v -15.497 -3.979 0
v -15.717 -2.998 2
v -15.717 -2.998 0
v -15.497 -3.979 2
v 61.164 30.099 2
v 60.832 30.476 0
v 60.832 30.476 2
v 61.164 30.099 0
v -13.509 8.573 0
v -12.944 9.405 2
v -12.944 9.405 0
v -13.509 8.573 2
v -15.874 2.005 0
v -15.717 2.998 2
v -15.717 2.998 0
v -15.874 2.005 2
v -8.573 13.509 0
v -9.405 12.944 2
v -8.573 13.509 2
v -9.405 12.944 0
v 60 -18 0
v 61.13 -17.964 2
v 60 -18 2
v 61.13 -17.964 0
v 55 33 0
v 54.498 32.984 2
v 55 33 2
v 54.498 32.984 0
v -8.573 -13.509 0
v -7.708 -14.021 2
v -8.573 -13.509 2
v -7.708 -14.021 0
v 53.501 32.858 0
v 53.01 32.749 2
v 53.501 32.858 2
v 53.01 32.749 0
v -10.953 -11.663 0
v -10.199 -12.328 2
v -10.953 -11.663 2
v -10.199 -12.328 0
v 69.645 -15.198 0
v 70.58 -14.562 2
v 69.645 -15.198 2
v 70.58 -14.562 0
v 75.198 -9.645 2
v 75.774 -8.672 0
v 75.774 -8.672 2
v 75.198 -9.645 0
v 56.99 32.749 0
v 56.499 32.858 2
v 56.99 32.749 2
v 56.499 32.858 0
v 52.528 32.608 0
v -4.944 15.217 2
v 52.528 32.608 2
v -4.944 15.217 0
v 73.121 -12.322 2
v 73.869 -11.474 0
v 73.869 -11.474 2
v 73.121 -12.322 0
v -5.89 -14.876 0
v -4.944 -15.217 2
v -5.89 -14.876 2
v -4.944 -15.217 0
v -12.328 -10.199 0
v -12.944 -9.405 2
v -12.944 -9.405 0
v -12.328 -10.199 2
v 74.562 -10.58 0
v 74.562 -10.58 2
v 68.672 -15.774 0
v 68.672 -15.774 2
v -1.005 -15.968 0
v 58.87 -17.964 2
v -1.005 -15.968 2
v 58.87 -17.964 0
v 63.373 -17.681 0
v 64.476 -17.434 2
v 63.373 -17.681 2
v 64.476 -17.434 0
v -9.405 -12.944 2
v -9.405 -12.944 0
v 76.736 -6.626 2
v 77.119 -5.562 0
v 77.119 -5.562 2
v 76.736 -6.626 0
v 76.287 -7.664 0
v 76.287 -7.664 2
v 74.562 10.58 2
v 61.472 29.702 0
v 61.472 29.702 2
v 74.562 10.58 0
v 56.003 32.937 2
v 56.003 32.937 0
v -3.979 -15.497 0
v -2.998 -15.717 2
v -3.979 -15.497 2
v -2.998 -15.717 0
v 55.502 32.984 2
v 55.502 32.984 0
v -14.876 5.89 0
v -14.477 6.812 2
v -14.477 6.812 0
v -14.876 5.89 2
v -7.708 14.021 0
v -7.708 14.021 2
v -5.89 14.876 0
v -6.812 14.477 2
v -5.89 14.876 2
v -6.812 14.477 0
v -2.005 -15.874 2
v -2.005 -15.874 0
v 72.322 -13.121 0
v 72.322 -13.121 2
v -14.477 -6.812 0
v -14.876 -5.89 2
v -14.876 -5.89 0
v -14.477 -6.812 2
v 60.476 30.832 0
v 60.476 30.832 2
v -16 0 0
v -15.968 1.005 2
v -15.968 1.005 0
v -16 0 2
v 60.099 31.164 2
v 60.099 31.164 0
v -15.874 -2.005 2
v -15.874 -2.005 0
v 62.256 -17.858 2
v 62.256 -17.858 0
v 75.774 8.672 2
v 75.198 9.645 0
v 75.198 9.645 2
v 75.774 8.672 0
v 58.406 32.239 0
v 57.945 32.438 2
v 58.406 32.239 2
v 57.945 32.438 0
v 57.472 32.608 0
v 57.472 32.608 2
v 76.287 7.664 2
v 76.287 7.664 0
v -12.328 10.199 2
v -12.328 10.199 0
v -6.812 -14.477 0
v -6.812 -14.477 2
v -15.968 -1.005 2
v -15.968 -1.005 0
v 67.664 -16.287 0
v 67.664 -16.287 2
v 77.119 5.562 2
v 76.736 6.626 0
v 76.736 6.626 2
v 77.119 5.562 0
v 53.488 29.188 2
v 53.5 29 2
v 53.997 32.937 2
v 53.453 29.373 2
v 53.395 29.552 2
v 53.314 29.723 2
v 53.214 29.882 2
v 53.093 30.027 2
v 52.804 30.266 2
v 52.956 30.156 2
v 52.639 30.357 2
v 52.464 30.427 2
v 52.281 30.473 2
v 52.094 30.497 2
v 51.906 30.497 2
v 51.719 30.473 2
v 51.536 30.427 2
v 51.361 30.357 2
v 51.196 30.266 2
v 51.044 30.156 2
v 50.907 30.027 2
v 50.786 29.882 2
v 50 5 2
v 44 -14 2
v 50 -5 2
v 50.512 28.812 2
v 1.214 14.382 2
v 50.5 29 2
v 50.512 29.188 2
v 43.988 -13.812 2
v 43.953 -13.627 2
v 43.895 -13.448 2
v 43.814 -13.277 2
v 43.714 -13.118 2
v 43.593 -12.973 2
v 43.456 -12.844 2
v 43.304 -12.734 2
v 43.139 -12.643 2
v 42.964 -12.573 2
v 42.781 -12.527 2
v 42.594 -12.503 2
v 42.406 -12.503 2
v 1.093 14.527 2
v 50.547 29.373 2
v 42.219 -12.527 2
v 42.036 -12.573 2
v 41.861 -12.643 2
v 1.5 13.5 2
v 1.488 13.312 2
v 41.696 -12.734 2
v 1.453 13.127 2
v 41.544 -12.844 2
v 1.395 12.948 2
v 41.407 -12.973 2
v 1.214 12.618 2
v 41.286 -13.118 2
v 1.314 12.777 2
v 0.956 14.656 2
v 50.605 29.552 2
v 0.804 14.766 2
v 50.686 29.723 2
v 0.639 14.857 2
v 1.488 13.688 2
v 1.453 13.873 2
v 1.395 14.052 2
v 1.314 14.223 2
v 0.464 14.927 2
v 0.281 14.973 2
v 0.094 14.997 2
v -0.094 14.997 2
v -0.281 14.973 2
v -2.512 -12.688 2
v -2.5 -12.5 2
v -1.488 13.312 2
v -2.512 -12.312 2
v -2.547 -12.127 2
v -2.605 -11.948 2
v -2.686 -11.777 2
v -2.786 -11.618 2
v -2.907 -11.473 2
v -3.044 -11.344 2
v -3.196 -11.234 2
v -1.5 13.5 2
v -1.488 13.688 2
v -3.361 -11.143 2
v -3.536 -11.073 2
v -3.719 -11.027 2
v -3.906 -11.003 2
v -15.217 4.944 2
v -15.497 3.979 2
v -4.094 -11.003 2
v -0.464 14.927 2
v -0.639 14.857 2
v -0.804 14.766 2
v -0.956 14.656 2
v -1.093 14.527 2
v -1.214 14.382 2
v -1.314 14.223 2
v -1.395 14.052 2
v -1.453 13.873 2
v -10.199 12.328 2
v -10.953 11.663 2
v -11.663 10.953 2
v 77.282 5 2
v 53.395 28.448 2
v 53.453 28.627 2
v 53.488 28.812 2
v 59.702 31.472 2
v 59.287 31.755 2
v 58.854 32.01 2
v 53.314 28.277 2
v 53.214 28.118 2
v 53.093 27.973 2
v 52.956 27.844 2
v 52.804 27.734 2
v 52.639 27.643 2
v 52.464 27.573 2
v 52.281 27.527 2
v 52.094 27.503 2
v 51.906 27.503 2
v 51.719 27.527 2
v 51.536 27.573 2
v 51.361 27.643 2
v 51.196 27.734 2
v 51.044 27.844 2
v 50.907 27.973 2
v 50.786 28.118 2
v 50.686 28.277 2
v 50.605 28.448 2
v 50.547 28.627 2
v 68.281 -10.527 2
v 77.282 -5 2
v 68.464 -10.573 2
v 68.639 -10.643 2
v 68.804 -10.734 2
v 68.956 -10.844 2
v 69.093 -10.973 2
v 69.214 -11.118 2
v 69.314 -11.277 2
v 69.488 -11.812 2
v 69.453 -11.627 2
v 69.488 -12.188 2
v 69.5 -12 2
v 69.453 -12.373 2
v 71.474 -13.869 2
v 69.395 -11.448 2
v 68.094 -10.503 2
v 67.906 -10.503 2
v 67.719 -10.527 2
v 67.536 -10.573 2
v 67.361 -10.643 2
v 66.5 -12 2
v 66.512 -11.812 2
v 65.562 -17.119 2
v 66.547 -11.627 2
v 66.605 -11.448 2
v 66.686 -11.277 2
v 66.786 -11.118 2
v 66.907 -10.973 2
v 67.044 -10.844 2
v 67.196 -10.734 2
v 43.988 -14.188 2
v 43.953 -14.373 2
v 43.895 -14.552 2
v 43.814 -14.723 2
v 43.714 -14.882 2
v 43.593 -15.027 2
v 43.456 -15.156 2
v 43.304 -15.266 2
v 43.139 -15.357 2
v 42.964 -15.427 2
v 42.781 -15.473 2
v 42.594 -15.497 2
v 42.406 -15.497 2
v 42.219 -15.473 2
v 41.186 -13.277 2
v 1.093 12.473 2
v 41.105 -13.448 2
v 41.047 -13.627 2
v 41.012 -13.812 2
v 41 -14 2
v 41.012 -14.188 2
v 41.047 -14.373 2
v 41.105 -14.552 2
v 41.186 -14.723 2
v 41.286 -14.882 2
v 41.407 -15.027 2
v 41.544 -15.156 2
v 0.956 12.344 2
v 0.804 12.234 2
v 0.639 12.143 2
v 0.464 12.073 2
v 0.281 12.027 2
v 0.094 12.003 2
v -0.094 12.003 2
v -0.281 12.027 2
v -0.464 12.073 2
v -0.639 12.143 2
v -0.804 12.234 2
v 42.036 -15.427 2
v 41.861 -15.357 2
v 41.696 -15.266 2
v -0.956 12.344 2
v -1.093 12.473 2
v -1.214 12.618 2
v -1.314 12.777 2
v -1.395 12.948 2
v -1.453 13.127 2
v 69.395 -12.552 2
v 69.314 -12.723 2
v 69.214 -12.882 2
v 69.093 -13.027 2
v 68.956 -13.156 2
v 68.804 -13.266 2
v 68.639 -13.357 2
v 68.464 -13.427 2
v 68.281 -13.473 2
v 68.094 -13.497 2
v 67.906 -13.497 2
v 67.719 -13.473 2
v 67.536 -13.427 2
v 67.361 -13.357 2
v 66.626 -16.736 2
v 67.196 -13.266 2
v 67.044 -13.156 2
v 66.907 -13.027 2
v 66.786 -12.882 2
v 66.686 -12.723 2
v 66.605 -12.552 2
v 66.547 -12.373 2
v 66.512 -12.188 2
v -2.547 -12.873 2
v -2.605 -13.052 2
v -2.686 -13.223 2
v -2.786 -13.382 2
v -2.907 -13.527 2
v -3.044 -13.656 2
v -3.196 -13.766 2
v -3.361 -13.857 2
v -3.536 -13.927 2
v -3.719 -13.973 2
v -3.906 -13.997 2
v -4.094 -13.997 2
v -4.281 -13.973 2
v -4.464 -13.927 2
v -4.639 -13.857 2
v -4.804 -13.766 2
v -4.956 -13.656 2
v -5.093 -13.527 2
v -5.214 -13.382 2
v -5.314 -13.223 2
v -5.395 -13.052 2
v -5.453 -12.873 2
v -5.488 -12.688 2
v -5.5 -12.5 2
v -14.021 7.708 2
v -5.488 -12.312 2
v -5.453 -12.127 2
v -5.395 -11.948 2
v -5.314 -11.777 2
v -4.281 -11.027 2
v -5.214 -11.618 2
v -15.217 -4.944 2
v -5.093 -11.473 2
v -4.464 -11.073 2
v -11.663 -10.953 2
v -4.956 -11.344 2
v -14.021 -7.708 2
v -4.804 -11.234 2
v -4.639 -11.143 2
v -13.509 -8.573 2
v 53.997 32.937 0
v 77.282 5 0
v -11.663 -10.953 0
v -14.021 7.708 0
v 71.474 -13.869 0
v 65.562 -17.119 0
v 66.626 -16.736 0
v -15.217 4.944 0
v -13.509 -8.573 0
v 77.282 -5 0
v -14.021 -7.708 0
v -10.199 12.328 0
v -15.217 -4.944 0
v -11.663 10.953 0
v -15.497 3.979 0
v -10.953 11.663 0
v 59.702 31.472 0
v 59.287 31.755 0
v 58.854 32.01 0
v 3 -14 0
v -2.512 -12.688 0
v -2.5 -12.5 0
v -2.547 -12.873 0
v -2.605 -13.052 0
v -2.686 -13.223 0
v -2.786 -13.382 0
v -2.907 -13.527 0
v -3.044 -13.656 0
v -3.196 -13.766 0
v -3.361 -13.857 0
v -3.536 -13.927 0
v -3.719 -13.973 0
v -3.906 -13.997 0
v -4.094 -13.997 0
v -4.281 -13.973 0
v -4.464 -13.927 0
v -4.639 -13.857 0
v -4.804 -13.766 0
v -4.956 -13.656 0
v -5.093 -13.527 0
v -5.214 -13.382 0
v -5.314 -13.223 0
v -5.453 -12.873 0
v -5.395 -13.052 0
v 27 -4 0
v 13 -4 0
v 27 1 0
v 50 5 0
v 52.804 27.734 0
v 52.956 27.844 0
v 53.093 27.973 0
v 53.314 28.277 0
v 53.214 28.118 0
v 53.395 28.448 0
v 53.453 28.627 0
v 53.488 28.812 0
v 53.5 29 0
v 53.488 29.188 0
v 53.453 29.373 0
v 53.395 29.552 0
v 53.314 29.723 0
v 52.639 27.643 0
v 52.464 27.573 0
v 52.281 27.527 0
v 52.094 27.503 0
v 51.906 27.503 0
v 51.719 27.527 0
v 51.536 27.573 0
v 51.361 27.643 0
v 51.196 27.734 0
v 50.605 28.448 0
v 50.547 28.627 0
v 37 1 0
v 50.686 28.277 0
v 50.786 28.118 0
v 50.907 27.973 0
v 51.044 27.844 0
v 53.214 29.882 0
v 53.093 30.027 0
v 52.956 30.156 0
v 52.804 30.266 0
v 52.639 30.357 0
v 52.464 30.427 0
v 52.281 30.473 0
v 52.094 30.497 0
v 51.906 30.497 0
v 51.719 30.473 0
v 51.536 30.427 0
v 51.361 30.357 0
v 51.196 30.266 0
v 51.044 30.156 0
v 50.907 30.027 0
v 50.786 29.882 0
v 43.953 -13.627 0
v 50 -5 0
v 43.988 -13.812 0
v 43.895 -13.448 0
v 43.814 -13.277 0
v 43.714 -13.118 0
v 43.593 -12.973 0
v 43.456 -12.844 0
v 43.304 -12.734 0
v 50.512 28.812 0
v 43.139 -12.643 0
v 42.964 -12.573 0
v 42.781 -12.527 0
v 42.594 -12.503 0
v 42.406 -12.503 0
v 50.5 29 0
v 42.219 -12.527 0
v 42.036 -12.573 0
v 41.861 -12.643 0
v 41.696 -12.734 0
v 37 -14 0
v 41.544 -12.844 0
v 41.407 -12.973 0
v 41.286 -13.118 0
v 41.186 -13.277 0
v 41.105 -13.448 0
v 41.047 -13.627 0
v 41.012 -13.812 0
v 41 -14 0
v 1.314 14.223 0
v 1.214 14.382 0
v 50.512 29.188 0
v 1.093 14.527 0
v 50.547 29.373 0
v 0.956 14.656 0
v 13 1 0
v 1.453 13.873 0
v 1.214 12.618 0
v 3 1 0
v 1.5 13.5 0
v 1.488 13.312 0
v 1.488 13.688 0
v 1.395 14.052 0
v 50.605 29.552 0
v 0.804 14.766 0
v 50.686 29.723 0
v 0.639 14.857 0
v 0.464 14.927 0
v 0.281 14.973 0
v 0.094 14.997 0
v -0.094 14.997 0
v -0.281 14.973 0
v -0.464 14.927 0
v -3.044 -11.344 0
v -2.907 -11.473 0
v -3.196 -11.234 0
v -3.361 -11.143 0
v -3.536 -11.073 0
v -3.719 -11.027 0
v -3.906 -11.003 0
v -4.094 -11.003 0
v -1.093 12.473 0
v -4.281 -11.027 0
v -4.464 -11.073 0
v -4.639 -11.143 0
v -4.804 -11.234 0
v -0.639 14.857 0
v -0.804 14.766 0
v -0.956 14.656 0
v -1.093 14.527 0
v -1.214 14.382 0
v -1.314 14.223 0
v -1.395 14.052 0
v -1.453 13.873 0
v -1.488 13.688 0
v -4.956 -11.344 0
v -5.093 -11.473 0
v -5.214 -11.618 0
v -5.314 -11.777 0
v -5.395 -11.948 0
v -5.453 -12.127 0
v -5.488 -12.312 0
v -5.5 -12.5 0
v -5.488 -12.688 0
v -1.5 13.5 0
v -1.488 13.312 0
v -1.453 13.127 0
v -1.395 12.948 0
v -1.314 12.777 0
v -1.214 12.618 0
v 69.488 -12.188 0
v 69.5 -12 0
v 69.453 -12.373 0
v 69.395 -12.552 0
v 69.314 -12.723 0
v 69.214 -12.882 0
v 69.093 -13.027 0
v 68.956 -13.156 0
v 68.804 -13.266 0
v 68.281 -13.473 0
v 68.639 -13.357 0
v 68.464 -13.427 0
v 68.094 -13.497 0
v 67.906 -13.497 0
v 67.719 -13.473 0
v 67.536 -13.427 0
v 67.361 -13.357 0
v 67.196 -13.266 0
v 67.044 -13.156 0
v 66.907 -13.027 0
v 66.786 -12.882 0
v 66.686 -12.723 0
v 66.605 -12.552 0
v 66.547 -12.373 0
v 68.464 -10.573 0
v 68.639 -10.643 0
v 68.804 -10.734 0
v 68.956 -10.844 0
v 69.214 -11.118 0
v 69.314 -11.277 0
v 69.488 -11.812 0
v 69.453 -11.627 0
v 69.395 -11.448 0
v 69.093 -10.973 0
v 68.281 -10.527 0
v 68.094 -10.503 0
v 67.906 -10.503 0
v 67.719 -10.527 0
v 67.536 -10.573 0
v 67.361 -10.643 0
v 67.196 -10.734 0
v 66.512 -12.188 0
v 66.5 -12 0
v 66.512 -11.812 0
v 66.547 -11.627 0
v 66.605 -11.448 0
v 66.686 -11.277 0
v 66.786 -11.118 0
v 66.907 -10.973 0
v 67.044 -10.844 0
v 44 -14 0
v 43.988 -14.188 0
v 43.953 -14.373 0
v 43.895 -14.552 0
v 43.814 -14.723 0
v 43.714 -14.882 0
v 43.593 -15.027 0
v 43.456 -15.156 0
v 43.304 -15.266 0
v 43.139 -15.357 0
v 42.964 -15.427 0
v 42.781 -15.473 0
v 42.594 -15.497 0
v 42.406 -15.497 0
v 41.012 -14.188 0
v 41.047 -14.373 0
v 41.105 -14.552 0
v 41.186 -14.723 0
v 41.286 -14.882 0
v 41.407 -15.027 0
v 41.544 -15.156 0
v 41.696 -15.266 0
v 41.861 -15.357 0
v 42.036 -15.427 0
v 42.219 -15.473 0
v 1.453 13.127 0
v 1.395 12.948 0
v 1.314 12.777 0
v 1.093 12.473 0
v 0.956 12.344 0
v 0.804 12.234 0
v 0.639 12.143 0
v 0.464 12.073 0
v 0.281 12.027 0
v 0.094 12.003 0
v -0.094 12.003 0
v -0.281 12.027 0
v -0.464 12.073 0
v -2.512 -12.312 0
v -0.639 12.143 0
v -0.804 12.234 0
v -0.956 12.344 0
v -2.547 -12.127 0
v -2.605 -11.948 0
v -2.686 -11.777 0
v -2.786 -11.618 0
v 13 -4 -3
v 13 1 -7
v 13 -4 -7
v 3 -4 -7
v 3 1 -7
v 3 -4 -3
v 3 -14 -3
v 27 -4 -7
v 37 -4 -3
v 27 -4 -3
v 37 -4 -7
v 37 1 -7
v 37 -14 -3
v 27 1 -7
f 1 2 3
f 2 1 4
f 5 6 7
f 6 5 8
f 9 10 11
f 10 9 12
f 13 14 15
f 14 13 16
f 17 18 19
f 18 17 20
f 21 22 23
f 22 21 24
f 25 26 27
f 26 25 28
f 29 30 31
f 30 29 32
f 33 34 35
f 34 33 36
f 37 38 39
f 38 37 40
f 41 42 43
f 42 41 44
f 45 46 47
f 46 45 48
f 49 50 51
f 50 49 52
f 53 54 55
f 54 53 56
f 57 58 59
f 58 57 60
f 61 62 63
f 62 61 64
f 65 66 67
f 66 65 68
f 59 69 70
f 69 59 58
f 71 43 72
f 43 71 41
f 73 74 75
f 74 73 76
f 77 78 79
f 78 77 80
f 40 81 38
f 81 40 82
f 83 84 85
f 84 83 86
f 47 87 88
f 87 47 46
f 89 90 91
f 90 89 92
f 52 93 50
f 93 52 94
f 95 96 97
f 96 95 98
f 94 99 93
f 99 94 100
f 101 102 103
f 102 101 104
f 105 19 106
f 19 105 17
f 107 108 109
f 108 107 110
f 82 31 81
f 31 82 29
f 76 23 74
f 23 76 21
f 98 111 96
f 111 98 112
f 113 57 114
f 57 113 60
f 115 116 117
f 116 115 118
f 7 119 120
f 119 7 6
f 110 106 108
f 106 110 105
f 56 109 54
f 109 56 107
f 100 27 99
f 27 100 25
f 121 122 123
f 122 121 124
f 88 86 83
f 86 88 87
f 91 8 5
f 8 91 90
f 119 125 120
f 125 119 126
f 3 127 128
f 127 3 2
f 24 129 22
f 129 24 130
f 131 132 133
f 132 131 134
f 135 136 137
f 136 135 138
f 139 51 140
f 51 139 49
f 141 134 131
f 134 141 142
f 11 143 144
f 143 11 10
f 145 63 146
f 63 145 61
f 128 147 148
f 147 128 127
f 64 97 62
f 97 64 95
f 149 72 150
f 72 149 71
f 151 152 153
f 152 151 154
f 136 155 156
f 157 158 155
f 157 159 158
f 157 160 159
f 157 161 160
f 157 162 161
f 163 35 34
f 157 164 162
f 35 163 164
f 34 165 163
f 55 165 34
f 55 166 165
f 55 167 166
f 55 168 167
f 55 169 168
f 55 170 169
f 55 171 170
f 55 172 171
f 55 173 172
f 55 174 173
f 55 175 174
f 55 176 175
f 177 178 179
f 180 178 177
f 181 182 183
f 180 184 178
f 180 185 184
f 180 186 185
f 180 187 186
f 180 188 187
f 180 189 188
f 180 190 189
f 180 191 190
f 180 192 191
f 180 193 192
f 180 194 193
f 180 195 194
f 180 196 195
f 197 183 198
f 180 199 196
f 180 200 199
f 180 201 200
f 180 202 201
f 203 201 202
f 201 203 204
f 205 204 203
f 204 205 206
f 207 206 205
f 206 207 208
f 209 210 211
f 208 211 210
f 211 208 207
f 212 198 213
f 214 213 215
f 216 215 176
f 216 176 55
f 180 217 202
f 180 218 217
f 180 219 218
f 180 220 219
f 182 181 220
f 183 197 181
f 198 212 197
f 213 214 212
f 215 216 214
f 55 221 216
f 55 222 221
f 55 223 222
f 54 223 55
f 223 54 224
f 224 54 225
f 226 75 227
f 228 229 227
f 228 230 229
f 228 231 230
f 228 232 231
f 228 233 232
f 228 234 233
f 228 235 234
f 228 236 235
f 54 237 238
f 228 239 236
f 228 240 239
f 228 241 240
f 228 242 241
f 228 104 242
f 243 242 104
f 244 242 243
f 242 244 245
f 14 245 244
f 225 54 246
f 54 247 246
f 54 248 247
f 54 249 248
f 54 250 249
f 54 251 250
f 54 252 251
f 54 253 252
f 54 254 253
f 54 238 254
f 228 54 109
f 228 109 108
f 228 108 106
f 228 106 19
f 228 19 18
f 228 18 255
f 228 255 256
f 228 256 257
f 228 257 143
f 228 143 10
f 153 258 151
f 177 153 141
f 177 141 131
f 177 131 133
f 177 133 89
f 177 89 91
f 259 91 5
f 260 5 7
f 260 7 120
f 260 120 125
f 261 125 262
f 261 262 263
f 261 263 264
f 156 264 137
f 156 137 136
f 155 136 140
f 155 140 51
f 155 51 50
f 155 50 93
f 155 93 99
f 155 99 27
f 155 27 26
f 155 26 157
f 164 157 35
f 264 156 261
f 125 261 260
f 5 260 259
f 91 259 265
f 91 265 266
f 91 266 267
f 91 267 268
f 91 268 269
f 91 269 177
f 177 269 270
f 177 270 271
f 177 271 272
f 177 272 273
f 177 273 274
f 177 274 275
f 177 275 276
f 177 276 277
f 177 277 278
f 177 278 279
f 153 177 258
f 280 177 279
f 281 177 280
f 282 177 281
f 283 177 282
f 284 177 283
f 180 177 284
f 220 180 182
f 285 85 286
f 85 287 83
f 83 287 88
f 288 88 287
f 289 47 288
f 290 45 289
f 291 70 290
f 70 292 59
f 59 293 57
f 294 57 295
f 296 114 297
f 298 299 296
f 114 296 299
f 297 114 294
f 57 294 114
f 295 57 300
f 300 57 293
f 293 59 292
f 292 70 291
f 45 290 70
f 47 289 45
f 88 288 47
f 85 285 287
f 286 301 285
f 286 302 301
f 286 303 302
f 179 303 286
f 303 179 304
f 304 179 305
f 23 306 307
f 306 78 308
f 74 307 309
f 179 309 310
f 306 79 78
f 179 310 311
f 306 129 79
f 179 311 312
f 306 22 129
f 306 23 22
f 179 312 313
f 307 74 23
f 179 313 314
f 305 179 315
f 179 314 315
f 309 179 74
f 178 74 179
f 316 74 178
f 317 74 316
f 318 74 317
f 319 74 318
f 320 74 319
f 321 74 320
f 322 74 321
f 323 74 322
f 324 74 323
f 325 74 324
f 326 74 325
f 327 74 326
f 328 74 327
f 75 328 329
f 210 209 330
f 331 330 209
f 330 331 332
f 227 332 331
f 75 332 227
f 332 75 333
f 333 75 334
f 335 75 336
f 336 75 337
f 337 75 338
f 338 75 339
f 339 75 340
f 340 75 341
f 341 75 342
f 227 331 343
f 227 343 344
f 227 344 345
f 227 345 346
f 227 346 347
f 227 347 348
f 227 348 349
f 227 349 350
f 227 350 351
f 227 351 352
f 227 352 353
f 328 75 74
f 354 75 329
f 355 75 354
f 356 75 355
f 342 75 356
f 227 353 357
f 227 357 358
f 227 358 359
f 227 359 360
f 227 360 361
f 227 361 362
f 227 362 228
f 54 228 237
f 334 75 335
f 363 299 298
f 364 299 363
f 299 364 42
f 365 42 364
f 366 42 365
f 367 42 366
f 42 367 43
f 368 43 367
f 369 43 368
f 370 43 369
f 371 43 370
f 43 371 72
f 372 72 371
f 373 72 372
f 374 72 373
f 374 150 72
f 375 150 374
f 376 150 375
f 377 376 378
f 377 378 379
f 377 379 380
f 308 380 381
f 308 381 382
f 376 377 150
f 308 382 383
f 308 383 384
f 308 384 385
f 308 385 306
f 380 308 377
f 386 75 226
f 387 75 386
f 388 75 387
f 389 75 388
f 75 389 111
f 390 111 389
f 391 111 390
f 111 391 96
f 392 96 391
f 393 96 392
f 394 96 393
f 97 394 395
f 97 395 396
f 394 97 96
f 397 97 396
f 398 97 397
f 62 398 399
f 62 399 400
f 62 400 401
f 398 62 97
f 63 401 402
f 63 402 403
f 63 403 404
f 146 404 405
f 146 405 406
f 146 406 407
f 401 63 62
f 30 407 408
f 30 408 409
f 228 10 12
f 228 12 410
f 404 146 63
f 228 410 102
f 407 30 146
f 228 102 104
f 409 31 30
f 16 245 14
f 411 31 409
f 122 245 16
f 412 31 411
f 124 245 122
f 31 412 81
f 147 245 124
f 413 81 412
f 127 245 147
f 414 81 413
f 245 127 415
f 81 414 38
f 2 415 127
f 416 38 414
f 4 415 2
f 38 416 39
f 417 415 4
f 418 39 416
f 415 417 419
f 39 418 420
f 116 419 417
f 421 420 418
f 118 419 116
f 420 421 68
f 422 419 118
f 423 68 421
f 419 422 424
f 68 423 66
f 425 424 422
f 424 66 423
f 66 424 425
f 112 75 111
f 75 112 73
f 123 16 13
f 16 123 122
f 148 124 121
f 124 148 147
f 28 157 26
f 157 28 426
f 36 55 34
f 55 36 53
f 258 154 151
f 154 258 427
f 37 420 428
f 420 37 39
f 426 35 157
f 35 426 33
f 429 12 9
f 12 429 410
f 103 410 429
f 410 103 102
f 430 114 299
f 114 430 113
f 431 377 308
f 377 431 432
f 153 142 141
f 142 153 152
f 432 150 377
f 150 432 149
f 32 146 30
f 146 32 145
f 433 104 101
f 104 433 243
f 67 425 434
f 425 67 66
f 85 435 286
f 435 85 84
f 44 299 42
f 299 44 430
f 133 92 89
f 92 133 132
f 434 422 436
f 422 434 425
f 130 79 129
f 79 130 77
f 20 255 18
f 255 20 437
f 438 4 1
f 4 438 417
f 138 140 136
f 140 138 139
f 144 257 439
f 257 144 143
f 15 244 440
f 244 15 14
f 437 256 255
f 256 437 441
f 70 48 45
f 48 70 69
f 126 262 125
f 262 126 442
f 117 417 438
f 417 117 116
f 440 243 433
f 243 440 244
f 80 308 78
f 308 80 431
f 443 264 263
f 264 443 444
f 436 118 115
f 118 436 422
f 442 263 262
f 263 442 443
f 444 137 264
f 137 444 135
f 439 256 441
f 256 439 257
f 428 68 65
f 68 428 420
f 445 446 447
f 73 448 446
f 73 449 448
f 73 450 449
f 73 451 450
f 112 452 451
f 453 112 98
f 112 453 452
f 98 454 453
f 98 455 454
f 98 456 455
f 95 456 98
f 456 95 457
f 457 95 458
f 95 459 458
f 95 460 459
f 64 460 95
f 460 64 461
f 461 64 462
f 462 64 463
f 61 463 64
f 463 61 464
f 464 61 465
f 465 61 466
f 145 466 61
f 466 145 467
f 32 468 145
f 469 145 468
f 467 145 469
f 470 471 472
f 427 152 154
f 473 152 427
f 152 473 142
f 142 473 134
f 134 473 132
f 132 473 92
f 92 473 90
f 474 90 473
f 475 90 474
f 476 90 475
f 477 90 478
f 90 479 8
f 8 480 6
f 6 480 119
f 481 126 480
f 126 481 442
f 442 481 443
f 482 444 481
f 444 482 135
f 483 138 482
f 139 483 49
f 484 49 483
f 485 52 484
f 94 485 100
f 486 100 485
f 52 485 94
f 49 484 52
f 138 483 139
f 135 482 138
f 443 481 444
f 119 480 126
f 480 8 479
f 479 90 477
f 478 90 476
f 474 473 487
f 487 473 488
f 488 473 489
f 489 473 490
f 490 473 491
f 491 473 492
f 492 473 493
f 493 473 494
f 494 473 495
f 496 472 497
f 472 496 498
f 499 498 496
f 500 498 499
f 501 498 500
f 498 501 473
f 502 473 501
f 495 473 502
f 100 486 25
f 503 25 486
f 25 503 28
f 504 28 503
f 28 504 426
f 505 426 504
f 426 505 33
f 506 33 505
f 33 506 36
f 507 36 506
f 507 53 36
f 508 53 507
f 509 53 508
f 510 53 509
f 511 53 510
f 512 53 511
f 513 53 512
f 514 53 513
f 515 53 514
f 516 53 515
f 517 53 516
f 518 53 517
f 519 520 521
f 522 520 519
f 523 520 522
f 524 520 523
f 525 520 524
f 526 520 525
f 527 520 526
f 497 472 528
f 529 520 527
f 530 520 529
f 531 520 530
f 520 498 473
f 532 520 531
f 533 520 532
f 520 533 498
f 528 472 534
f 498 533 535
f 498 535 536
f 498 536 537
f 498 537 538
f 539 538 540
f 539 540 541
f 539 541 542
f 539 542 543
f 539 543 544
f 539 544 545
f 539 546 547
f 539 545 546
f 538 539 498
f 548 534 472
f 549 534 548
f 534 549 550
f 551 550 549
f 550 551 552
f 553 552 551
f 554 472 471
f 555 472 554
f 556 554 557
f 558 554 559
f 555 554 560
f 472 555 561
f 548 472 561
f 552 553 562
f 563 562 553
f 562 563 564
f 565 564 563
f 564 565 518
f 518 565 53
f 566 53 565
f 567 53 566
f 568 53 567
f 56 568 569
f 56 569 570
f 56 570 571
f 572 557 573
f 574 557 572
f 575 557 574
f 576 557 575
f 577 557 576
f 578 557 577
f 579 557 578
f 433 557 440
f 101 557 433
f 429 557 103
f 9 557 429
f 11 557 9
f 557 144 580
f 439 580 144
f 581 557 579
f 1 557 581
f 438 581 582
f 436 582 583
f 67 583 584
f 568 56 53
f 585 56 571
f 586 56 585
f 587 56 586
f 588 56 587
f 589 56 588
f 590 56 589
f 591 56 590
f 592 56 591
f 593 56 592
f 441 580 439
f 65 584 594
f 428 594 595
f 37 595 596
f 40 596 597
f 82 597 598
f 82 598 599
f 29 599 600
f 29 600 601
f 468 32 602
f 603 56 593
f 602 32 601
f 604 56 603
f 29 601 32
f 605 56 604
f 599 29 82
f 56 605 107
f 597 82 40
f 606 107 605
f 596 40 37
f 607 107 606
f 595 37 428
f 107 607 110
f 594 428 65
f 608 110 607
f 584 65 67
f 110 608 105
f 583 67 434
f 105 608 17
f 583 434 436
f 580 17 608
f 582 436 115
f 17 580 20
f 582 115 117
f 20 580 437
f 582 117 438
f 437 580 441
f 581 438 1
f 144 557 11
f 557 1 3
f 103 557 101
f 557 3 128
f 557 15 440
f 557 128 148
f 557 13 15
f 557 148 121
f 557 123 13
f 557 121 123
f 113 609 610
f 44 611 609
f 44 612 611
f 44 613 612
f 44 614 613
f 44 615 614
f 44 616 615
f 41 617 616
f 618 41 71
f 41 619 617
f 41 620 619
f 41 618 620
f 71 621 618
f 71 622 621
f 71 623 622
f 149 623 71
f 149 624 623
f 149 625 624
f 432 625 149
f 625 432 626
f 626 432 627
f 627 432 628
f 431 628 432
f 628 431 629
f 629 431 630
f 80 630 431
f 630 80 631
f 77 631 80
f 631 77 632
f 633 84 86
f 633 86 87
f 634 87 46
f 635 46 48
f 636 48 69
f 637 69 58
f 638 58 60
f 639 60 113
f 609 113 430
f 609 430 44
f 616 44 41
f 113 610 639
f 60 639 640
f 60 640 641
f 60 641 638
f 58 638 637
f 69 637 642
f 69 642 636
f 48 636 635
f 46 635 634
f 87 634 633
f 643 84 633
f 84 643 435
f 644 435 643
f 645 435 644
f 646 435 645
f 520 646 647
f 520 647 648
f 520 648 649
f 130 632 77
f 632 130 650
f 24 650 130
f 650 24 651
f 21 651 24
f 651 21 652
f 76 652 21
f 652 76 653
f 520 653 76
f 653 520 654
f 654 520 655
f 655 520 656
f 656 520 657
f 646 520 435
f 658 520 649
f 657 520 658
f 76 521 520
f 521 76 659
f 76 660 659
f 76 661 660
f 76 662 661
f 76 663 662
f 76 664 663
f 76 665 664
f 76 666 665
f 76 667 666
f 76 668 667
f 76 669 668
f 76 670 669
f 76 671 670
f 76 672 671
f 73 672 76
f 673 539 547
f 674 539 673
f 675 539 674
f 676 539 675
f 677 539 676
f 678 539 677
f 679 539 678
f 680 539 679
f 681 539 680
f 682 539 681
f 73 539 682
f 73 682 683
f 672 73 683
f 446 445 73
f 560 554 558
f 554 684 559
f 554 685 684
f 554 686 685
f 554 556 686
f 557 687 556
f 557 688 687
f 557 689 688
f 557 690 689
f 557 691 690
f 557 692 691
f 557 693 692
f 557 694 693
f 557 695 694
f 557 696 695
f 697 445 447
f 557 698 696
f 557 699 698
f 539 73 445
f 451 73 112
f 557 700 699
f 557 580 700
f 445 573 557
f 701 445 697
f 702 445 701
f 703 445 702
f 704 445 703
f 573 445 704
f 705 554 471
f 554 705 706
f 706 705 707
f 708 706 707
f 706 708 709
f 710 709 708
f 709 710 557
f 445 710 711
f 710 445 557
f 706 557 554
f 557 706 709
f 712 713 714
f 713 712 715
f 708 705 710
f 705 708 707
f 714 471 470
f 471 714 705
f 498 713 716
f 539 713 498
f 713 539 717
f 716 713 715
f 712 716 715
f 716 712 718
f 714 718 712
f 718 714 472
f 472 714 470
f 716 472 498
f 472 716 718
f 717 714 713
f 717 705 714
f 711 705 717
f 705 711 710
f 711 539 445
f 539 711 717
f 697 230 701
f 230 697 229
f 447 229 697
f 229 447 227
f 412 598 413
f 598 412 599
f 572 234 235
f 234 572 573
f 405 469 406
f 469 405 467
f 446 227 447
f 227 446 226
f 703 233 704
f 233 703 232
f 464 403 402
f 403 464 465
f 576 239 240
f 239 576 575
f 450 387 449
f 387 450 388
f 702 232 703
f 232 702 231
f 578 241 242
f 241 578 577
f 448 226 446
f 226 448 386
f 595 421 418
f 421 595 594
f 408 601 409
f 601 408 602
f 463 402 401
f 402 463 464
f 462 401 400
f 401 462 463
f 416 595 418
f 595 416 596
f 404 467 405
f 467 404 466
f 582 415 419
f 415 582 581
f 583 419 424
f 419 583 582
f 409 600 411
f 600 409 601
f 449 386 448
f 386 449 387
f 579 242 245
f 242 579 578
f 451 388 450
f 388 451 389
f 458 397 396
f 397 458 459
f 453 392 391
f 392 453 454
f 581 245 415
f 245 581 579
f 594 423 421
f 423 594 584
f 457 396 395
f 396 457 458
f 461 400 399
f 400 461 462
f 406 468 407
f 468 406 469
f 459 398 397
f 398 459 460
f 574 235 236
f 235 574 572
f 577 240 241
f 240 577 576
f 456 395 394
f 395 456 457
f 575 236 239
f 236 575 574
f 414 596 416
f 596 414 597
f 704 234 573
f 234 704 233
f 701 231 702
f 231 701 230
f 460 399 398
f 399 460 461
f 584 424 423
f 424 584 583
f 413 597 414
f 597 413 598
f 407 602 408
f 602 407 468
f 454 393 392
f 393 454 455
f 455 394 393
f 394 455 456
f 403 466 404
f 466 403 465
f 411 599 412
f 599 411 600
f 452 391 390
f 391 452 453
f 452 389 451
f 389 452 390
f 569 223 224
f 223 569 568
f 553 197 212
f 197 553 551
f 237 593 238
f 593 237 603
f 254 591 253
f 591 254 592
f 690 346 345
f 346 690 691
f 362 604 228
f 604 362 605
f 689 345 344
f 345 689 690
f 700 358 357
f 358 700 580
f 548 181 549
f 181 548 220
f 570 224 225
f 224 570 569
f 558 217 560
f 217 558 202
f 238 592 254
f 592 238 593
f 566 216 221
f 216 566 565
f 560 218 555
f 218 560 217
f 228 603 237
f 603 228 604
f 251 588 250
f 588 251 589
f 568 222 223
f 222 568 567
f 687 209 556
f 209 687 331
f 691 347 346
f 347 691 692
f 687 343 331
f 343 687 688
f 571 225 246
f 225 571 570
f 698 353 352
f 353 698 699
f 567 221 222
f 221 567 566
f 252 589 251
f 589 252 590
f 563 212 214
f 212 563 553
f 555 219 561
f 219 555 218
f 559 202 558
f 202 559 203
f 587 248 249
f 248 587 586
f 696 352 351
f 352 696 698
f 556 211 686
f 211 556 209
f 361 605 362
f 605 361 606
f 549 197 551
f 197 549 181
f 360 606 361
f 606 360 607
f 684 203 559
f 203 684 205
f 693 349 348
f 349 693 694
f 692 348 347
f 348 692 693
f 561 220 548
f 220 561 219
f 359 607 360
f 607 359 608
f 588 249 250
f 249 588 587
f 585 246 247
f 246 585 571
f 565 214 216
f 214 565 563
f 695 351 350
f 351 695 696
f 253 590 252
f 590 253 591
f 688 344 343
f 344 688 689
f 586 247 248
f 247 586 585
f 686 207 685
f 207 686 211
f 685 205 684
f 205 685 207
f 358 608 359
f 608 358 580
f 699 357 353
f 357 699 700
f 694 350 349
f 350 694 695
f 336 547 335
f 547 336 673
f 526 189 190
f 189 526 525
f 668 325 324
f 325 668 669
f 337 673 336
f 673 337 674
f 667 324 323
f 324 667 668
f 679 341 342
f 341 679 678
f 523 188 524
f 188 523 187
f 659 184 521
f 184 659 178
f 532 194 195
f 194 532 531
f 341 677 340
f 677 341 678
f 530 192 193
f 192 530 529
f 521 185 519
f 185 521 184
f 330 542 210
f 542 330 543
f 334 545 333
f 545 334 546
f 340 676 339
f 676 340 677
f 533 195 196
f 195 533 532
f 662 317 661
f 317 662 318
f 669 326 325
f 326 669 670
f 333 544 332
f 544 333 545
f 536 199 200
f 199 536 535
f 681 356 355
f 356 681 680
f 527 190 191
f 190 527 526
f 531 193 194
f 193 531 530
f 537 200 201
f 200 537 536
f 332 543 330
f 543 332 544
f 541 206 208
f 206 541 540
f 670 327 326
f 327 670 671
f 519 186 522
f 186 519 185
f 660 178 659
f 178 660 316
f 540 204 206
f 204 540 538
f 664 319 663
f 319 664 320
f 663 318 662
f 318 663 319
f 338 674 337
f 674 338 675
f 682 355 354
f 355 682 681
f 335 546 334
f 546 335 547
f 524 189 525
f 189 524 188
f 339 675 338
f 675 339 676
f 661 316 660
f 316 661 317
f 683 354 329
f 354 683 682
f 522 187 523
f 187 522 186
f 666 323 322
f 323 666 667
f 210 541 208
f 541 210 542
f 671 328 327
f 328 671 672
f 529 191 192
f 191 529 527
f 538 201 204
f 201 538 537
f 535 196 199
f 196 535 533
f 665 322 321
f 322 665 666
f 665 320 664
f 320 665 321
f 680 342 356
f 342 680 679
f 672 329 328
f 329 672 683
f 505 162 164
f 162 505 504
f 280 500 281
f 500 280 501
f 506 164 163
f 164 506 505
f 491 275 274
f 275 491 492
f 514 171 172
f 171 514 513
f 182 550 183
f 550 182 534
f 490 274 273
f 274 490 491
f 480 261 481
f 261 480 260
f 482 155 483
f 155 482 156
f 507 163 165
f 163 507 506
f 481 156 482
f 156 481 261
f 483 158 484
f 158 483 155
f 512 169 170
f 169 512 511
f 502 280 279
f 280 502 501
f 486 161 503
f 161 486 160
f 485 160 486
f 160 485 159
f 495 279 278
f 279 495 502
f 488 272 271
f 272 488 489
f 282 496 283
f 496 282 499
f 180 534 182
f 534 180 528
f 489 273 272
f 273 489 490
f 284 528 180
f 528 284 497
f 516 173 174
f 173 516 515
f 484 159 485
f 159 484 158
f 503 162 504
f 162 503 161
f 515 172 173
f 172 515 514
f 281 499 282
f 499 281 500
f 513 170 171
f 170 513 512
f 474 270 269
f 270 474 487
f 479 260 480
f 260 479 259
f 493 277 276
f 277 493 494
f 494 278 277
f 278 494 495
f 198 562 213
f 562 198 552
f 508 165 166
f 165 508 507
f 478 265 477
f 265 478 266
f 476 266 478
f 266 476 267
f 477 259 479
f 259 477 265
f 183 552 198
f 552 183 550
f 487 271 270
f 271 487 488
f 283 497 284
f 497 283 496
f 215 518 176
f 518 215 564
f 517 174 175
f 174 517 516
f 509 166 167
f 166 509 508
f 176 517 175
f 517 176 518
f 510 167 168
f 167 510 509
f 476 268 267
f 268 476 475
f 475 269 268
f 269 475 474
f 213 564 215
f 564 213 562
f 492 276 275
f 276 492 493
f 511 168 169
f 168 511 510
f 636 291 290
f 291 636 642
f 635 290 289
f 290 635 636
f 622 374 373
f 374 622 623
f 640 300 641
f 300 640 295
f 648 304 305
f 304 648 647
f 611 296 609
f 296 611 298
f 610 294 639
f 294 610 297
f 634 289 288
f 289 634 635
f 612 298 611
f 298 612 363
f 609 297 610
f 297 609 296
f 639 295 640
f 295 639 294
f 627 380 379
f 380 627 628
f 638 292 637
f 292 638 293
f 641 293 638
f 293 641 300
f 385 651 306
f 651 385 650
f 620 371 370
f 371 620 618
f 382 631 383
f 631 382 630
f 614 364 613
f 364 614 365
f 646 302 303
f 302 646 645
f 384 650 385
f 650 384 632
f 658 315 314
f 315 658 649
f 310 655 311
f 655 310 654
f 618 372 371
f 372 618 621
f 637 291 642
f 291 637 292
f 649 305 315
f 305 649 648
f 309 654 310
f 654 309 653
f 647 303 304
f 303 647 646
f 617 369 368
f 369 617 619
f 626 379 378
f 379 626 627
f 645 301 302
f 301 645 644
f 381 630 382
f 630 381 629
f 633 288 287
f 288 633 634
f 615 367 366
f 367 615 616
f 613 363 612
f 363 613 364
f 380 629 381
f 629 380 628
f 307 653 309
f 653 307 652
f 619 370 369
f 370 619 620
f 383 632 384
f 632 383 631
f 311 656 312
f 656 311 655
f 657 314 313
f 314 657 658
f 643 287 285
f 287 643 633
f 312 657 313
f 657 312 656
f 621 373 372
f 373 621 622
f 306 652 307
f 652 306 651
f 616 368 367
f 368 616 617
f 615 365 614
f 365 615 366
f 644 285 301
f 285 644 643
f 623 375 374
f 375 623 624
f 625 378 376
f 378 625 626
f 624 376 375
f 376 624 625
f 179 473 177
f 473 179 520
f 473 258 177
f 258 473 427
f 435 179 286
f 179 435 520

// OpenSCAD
r_ext=16;
ep=2;
hauteur=103;
r_vis=1.4;

module boitier(){
	difference(){
		hull(){
			cylinder(h = hauteur, r = r_ext, $fn=100);
			translate([60,0,0]){cylinder(h = hauteur, r = r_ext+2, $fn=100);}
			translate([55,25,0]){cylinder(h = hauteur, r = 8, $fn=100);}
		}

		//évidement intérieur général
		hull(){
			translate([0,0,-2])cylinder(h = hauteur+5, r = r_ext-ep, $fn=100);
			translate([60,0,-2]){cylinder(h = hauteur+5, r = r_ext+2-ep, $fn=100);}
			translate([55,25,-2]){cylinder(h = hauteur+5, r = 6, $fn=100);}
		}
		//ouvertures pour écran
		translate([7,-r_ext-5,12.5]){cube([26,10,78]);}

		//trous pour visser carte
		translate([-8,-r_ext-5,5]){rotate([-90,0,0])cylinder(h = 15, r = 2, $fn=50);}
		translate([-8,-r_ext-5,hauteur-5]){rotate([-90,0,0])cylinder(h = 15, r = 2, $fn=50);}

		//trou pour encodeur
		translate([59,-r_ext-5,63]){rotate([-90,0,0])cylinder(h = 15, r = 5, $fn=50);}
		
		
	}

	//ajout pour vissage des flancs
	difference(){
		union(){
			translate([-4,-r_ext+3.5,0])cylinder(h = hauteur, r = 2.5, $fn=50);
			translate([0,r_ext-2.5,0])cylinder(h = hauteur, r = 2.5, $fn=50);
			translate([42.5,-r_ext+2,0])cylinder(h = hauteur, r = 2.5, $fn=50);
			translate([52,29,0])cylinder(h = hauteur, r = 2.5, $fn=50);
			translate([68,-r_ext+4,0])cylinder(h = hauteur, r = 2.5, $fn=50);
		}

		translate([-4,-r_ext+3.5,-2])cylinder(h = hauteur+10, r = r_vis, $fn=50);
		translate([0,r_ext-2.5,-2])cylinder(h = hauteur+10, r = r_vis, $fn=50);
		translate([42.5,-r_ext+2,-2])cylinder(h = hauteur+10, r = r_vis, $fn=50);
		translate([52,29,-2])cylinder(h = hauteur+10, r = r_vis, $fn=50);
		translate([68,-r_ext+4,-2])cylinder(h = hauteur+10, r = r_vis, $fn=50);
	}
	

}

module capot(){
	difference(){
        union(){
            hull(){
                cylinder(h = ep, r = r_ext, $fn=100);
                translate([60,0,0]){cylinder(h = ep, r = r_ext+2, $fn=100);}
                translate([55,25,0]){cylinder(h = ep, r = 8, $fn=100);}
            }
            //déport pour maintenir l'écran en place
            translate([-r_ext+19,-r_ext+12,-7]){cube([10,5,7]);}
            translate([-r_ext+43,-r_ext+12,-7]){cube([10,5,7]);}
            translate([-r_ext+19,-r_ext+ep,-3]){cube([34,10,3]);}
            
        }
        //trous de vissage
        translate([-4,-r_ext+3.5,-2])cylinder(h = hauteur+10, r = 1.5, $fn=50);
        translate([0,r_ext-2.5,-2])cylinder(h = hauteur+10, r = 1.5, $fn=50);
        translate([42.5,-r_ext+2,-2])cylinder(h = hauteur+10, r = 1.5, $fn=50);
        translate([52,29,-2])cylinder(h = hauteur+10, r = 1.5, $fn=50);
        translate([68,-r_ext+4,-2])cylinder(h = hauteur, r = 1.5, $fn=50);

        //trou pour carte SD
        translate([50,-5,-2]){cube([30,10,5]);}
	}
}

//boitier();
capot();
//translate([0,0,-ep])capot();
